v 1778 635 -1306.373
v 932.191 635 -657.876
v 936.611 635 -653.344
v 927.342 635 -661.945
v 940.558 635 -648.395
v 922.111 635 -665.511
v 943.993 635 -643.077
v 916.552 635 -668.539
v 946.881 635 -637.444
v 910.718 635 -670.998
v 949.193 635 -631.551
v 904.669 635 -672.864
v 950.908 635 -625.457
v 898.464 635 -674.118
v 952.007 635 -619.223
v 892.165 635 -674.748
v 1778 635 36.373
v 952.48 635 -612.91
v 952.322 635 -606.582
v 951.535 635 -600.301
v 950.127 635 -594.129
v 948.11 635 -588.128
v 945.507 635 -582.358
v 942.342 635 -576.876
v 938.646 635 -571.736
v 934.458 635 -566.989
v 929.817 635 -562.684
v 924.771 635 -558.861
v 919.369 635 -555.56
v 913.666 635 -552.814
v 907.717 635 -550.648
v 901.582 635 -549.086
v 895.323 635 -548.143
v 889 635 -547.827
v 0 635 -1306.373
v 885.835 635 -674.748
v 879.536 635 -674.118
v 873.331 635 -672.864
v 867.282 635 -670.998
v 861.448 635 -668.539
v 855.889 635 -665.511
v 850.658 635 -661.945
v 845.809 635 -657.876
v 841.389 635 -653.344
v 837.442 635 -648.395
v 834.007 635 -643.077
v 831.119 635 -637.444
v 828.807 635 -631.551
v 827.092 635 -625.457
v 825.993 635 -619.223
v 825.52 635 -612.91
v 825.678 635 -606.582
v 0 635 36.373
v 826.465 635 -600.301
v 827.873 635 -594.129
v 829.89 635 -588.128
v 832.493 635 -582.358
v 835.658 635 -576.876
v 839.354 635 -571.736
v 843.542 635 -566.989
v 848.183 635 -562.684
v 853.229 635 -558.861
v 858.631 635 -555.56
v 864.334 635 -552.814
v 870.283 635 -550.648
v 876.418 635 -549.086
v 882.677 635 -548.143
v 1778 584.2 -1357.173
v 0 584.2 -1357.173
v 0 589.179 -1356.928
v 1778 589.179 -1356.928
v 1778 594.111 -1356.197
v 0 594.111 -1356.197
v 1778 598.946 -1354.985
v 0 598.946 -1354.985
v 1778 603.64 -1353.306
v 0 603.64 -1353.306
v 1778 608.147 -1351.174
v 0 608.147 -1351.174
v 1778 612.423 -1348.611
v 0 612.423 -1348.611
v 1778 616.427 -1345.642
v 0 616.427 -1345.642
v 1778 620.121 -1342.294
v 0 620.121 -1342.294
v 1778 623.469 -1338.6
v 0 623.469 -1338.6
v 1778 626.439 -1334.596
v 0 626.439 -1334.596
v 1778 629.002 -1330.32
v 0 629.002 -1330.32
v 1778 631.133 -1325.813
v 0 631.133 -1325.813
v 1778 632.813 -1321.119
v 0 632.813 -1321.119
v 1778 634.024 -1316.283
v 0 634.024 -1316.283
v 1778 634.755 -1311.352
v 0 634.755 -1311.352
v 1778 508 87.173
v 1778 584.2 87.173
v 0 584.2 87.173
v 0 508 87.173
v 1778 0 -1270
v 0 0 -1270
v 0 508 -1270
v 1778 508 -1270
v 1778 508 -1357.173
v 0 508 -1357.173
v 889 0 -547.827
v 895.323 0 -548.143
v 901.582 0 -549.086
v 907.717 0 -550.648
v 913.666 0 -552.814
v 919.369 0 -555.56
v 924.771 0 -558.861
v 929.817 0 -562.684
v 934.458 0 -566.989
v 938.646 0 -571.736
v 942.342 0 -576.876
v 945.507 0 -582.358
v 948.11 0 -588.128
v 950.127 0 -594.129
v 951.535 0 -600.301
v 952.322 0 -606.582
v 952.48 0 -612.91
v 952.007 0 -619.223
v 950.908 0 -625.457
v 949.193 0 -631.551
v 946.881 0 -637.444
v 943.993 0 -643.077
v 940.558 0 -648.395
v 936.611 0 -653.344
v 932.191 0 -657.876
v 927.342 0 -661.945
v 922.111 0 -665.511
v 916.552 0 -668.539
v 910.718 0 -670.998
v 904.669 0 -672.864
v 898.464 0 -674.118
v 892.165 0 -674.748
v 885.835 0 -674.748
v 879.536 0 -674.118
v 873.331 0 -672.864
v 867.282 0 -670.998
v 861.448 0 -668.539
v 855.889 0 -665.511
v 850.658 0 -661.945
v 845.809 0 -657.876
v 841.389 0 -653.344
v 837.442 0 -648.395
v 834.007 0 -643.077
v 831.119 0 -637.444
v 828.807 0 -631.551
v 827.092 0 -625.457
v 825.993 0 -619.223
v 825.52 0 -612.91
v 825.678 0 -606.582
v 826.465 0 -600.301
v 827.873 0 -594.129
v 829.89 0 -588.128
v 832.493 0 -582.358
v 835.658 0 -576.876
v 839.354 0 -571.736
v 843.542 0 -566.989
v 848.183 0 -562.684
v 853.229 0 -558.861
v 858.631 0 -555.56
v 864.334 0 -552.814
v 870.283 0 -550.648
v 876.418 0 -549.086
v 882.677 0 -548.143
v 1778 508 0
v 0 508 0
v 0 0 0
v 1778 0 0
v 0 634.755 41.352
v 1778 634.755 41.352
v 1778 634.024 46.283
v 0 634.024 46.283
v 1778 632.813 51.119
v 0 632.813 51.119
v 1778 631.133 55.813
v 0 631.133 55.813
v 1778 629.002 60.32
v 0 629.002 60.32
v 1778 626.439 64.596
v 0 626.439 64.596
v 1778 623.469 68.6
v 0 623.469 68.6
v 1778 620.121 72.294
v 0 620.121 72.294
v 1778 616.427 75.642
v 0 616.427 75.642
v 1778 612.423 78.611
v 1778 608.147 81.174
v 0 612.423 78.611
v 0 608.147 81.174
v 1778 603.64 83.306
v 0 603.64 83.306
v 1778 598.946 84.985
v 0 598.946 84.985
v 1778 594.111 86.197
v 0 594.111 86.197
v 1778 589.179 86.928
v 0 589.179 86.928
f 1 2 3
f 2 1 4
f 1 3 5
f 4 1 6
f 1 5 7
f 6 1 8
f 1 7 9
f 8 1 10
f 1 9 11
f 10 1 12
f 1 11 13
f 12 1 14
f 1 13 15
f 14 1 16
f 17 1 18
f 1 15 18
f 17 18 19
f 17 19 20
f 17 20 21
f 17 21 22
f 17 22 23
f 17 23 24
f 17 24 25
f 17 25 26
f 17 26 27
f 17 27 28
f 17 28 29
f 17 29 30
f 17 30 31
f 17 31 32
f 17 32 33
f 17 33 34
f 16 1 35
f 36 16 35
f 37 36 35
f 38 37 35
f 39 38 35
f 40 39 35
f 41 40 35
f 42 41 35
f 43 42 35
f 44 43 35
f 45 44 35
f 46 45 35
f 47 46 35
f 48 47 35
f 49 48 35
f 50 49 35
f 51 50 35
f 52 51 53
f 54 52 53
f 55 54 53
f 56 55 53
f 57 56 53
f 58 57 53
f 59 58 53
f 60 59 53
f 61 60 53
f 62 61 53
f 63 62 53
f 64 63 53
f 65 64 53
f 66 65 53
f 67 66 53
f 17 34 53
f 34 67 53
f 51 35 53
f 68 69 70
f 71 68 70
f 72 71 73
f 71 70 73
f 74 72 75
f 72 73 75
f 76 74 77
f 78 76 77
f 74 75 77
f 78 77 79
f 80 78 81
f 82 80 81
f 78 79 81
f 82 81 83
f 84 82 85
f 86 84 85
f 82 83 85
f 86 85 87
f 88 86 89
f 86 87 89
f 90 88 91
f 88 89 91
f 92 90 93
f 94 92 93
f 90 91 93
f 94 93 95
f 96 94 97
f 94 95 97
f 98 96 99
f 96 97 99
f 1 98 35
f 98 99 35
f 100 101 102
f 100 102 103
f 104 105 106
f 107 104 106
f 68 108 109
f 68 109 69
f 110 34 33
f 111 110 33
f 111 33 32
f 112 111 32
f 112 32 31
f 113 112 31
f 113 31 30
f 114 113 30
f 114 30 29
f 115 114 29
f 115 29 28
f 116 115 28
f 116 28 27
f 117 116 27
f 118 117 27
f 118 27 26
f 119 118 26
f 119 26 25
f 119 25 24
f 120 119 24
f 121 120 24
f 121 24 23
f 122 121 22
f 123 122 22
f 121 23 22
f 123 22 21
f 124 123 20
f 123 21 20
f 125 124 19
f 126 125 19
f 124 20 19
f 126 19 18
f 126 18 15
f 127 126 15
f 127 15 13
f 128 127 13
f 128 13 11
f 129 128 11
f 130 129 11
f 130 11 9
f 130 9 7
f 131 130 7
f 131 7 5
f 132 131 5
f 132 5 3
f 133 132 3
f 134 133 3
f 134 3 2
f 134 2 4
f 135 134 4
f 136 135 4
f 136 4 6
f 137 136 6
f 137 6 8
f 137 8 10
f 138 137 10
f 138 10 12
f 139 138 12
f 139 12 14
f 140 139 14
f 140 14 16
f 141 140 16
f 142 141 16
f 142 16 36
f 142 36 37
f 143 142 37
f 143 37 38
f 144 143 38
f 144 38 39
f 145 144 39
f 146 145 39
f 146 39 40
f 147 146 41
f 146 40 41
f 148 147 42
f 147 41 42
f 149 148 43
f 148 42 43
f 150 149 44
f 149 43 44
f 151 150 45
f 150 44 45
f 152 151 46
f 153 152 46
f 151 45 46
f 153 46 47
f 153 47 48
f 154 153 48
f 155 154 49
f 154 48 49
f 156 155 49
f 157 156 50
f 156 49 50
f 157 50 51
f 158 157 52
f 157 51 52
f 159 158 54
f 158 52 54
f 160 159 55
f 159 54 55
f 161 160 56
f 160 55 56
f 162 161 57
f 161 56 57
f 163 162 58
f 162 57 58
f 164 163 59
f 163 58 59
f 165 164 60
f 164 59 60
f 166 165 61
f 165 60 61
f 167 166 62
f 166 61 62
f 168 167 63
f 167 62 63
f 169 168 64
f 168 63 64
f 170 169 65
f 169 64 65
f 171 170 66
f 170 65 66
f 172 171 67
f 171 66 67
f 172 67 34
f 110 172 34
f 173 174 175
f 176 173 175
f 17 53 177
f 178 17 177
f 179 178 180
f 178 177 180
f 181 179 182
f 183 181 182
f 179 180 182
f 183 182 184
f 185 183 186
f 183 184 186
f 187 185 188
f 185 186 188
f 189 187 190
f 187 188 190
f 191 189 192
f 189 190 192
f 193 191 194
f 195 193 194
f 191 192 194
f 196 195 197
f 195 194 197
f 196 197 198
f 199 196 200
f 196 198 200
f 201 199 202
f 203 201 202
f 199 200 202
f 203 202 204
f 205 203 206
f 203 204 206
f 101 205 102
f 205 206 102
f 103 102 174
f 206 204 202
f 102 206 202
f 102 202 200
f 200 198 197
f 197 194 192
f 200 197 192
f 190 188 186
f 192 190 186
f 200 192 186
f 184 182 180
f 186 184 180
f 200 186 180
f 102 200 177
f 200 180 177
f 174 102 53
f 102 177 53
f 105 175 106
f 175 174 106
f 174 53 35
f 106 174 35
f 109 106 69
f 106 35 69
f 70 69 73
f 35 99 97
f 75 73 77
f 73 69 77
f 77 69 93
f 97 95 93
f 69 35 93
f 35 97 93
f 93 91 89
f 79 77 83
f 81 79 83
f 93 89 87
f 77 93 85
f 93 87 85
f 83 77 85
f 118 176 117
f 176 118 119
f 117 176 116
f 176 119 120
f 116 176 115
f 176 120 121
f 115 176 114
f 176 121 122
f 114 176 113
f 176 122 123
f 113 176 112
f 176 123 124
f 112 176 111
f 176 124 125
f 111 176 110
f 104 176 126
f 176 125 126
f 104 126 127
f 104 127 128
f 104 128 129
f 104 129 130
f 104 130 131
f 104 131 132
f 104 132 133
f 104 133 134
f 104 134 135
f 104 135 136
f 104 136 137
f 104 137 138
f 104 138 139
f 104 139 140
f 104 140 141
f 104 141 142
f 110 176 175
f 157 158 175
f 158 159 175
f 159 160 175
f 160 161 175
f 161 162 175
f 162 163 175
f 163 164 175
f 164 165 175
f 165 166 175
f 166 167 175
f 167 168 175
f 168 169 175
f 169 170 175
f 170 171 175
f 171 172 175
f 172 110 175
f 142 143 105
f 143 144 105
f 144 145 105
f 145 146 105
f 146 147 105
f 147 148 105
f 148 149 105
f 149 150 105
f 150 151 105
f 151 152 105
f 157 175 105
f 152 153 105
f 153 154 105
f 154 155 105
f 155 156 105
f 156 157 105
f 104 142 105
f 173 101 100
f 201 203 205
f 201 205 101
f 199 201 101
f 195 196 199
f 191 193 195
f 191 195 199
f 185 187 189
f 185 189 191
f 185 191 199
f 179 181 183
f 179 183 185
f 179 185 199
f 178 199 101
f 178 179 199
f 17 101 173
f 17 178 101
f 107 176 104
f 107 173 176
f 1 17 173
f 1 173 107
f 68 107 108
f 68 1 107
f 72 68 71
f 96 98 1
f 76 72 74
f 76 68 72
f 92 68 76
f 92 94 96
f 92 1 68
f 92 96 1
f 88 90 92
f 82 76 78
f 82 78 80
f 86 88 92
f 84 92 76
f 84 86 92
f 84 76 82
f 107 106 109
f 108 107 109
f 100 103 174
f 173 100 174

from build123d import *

# Parameters (mm, degrees)
BOSS_EXTRUDE1_DEPTH = 1778
SKETCH2_R           = 63.5
CUT_EXTRUDE1_DEPTH  = 1778


with BuildPart() as part:
    # Sketch1 → Boss-Extrude1 (new body)
    with BuildSketch(Plane(origin=(0, 0, 0), x_dir=(0, 0, -1), z_dir=(1, 0, 0))):
        with BuildLine():
            Line((0, 0), (1270, 0))
            Line((1270, 0), (1270, 508))
            Line((1270, 508), (1357.172672295, 508))
            Line((1357.172672295, 508), (1357.172672295, 584.2))
            ThreePointArc((1357.172672295, 584.2), (1342.293696779, 620.121024484), (1306.372672295, 635))
            Line((1306.372672295, 635), (-36.372672295, 635))
            ThreePointArc((-36.372672295, 635), (-72.293696779, 620.121024484), (-87.172672295, 584.2))
            Line((-87.172672295, 584.2), (-87.172672295, 508))
            Line((-87.172672295, 508), (0, 508))
            Line((0, 508), (0, 0))
        make_face()
    extrude(amount=BOSS_EXTRUDE1_DEPTH)

    # Sketch2 → Cut-Extrude1 (cut)
    with BuildSketch(Plane(origin=(0, 635, 0), x_dir=(1, 0, 0), z_dir=(0, 1, 0))):
        with Locations(Location((889, 611.327327705, 0), (0, 0, 270))):
            Circle(SKETCH2_R)
    extrude(amount=-CUT_EXTRUDE1_DEPTH, mode=Mode.SUBTRACT)


solid = part.part
